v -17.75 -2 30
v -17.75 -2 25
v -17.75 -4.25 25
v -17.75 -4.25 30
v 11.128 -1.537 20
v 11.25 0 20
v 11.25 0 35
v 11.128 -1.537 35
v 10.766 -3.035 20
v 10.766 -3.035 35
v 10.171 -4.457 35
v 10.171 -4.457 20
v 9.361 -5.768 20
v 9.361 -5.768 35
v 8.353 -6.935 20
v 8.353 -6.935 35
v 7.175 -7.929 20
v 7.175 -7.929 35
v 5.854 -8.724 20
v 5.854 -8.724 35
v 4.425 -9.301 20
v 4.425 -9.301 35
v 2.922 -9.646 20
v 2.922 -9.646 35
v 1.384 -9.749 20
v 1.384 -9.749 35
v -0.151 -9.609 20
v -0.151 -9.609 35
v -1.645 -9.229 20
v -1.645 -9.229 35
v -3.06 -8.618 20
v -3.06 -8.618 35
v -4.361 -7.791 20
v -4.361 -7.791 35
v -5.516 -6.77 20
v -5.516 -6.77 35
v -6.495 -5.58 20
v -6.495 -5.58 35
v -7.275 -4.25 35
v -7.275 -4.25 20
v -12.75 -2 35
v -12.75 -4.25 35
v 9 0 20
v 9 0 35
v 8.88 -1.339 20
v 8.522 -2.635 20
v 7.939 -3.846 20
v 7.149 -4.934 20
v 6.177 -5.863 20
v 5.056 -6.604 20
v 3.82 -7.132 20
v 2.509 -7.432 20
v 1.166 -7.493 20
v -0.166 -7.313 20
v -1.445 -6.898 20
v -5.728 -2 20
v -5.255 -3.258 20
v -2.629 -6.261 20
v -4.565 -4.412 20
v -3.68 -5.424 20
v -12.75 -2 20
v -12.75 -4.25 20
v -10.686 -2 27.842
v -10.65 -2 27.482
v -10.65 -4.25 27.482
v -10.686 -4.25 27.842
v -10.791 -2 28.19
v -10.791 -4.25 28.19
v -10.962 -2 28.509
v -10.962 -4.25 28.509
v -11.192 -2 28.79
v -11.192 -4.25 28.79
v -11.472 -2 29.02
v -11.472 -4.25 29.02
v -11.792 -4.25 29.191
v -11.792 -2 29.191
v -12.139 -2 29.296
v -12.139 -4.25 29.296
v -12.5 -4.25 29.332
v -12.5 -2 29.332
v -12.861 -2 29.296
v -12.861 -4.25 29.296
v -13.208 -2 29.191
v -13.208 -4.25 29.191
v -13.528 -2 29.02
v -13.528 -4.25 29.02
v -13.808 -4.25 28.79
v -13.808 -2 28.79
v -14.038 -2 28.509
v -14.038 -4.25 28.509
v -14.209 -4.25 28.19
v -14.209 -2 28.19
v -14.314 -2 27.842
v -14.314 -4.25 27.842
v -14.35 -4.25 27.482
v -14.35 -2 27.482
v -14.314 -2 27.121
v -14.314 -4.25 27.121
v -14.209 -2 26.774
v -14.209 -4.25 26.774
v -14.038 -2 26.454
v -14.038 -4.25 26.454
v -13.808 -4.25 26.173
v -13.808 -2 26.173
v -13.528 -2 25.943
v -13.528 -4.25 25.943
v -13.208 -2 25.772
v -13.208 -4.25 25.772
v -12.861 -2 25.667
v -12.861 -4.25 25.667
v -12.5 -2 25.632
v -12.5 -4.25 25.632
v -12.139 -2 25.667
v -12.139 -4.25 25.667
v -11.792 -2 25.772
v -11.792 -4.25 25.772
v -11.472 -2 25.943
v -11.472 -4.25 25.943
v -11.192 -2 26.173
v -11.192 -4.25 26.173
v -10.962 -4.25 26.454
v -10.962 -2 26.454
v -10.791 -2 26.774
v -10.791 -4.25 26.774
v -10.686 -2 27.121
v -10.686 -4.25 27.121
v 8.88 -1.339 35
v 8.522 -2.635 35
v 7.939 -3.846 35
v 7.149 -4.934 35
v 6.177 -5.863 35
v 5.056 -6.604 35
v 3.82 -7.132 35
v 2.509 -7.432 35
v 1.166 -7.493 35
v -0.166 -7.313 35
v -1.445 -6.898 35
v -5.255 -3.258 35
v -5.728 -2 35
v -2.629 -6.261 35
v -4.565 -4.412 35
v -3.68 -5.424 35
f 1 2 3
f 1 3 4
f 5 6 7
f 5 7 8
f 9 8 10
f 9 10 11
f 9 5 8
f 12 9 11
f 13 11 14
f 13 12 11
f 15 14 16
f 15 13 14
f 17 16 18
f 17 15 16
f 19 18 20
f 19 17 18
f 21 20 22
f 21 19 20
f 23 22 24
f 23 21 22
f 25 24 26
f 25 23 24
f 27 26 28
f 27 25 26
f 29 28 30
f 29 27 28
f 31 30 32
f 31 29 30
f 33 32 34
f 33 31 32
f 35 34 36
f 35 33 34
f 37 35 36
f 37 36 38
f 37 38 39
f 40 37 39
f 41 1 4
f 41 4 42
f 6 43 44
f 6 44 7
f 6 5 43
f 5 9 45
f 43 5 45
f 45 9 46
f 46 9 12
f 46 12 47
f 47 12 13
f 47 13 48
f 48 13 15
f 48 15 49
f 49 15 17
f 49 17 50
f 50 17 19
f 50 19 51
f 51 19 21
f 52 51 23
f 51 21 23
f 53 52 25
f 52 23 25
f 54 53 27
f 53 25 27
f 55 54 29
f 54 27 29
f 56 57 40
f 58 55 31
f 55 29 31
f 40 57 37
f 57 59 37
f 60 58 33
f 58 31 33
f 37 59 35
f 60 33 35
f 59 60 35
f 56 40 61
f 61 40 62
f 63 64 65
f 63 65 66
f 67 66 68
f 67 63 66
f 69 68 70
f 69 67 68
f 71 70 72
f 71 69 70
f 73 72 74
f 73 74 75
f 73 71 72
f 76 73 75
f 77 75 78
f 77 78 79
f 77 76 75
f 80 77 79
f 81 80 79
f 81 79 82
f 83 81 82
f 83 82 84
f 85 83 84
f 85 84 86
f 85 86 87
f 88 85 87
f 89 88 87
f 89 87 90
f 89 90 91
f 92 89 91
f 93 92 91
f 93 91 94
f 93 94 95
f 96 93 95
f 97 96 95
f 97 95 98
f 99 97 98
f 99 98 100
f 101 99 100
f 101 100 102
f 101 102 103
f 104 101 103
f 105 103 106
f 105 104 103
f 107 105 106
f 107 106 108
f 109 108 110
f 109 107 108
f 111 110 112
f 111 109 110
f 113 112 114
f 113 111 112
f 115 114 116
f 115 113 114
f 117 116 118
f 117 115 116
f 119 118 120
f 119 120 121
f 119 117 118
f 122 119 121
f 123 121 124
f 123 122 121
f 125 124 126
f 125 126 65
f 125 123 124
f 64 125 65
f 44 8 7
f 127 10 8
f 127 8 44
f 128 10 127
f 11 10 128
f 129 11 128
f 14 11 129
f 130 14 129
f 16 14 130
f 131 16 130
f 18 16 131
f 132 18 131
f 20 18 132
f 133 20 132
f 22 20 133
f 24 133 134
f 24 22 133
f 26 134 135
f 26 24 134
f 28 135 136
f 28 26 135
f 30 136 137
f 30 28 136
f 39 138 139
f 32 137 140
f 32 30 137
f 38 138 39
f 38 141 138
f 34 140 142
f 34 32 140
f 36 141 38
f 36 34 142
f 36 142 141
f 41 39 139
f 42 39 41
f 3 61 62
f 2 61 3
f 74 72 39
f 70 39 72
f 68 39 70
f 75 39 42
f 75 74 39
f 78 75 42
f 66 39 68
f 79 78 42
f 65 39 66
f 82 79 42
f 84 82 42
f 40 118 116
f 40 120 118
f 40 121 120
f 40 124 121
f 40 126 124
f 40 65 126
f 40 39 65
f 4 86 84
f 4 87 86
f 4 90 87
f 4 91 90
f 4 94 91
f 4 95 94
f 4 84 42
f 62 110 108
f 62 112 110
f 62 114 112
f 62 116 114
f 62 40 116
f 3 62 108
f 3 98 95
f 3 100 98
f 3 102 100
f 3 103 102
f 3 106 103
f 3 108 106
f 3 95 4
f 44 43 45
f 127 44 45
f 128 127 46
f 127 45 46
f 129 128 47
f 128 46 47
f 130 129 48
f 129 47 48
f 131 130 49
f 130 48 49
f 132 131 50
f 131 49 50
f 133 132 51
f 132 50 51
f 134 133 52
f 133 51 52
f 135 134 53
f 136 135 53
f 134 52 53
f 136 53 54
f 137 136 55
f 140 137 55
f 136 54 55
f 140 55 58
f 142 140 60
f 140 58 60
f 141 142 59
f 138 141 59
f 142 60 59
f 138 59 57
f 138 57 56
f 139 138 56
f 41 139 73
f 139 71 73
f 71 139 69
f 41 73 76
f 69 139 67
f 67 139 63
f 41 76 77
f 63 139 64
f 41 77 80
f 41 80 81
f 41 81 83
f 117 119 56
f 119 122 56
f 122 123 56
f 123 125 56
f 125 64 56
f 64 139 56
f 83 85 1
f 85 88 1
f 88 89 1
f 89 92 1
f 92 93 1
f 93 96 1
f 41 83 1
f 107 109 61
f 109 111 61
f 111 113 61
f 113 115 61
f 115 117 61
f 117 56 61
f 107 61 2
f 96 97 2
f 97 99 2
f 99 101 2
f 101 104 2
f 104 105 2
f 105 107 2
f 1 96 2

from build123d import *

# Parameters (mm, degrees)
SKETCH016_R       = 1.85
EXTRUDE013_DEPTH  = 12
CYLINDER007_R     = 5
CYLINDER007_DEPTH = 1
EXTRUDE012_DEPTH  = 15


with BuildPart() as extrude013:
    # Sketch016 → Extrude013 (new body)
    with BuildSketch(Plane.XZ):
        Polygon((11.75, 36), (11.75, 19), (-13.25, 19), (-19.25, 25), (-19.25, 30), (-13.25, 36), align=None)
        with Locations((-14, 27.481564)):
            Circle(SKETCH016_R, mode=Mode.SUBTRACT)
    extrude(amount=-EXTRUDE013_DEPTH)


with BuildPart() as unprintable:
    # Cylinder007 → Cylinder007 (new body)
    with BuildSketch(Plane(origin=(-14, 18, 27.5), x_dir=(1, 0, 0), z_dir=(0, -1, 0))):
        Circle(CYLINDER007_R)
    extrude(amount=CYLINDER007_DEPTH)


with BuildPart() as body007:
    # Sketch015 → Extrude012 (new body)
    with BuildSketch(Plane.XY.offset(50)):
        with BuildLine():
            ThreePointArc((7.5, 0), (1.009178, 7.431794), (-7.228416, 2))
            Line((-7.228416, 2), (-21.228416, 2))
            Line((-21.228416, 4.25), (-21.228416, 2))
            Line((-8.774964, 4.25), (-21.228416, 4.25))
            ThreePointArc((9.75, 0), (2.180206, 9.503115), (-8.774964, 4.25))
            Line((7.5, 0), (9.75, 0))
        make_face()
    extrude(amount=EXTRUDE012_DEPTH)


with BuildPart() as body007_1:
    # Extrude012 placement: moved
    add(body007.part.moved(Location((0, 0, -30))))

    # Fusion016: union unprintable
    add(unprintable.part)

    # Common001: intersect Extrude013
    add(extrude013.part, mode=Mode.INTERSECT)


with BuildPart() as body007_2:
    # Common001 placement: moved
    add(body007_1.part.moved(Location((1.5, 0, 0))))


with BuildPart() as body007_3:
    # Clone007 placement: moved
    add(body007_2.part.moved(Location((-1.5, 0, 0))))


with BuildPart() as part_mirroring008:
    # Part__Mirroring008: instance of Body007
    add(body007_3.part.mirror(Plane(origin=(0, 0, 0), x_dir=(1, 0, 0), z_dir=(0, 1, 0))))


with BuildPart() as part_mirroring008_1:
    # Part__Mirroring008 placement: moved
    add(part_mirroring008.part.moved(Location((1.5, 0, 0))))


solid = part_mirroring008_1.part
